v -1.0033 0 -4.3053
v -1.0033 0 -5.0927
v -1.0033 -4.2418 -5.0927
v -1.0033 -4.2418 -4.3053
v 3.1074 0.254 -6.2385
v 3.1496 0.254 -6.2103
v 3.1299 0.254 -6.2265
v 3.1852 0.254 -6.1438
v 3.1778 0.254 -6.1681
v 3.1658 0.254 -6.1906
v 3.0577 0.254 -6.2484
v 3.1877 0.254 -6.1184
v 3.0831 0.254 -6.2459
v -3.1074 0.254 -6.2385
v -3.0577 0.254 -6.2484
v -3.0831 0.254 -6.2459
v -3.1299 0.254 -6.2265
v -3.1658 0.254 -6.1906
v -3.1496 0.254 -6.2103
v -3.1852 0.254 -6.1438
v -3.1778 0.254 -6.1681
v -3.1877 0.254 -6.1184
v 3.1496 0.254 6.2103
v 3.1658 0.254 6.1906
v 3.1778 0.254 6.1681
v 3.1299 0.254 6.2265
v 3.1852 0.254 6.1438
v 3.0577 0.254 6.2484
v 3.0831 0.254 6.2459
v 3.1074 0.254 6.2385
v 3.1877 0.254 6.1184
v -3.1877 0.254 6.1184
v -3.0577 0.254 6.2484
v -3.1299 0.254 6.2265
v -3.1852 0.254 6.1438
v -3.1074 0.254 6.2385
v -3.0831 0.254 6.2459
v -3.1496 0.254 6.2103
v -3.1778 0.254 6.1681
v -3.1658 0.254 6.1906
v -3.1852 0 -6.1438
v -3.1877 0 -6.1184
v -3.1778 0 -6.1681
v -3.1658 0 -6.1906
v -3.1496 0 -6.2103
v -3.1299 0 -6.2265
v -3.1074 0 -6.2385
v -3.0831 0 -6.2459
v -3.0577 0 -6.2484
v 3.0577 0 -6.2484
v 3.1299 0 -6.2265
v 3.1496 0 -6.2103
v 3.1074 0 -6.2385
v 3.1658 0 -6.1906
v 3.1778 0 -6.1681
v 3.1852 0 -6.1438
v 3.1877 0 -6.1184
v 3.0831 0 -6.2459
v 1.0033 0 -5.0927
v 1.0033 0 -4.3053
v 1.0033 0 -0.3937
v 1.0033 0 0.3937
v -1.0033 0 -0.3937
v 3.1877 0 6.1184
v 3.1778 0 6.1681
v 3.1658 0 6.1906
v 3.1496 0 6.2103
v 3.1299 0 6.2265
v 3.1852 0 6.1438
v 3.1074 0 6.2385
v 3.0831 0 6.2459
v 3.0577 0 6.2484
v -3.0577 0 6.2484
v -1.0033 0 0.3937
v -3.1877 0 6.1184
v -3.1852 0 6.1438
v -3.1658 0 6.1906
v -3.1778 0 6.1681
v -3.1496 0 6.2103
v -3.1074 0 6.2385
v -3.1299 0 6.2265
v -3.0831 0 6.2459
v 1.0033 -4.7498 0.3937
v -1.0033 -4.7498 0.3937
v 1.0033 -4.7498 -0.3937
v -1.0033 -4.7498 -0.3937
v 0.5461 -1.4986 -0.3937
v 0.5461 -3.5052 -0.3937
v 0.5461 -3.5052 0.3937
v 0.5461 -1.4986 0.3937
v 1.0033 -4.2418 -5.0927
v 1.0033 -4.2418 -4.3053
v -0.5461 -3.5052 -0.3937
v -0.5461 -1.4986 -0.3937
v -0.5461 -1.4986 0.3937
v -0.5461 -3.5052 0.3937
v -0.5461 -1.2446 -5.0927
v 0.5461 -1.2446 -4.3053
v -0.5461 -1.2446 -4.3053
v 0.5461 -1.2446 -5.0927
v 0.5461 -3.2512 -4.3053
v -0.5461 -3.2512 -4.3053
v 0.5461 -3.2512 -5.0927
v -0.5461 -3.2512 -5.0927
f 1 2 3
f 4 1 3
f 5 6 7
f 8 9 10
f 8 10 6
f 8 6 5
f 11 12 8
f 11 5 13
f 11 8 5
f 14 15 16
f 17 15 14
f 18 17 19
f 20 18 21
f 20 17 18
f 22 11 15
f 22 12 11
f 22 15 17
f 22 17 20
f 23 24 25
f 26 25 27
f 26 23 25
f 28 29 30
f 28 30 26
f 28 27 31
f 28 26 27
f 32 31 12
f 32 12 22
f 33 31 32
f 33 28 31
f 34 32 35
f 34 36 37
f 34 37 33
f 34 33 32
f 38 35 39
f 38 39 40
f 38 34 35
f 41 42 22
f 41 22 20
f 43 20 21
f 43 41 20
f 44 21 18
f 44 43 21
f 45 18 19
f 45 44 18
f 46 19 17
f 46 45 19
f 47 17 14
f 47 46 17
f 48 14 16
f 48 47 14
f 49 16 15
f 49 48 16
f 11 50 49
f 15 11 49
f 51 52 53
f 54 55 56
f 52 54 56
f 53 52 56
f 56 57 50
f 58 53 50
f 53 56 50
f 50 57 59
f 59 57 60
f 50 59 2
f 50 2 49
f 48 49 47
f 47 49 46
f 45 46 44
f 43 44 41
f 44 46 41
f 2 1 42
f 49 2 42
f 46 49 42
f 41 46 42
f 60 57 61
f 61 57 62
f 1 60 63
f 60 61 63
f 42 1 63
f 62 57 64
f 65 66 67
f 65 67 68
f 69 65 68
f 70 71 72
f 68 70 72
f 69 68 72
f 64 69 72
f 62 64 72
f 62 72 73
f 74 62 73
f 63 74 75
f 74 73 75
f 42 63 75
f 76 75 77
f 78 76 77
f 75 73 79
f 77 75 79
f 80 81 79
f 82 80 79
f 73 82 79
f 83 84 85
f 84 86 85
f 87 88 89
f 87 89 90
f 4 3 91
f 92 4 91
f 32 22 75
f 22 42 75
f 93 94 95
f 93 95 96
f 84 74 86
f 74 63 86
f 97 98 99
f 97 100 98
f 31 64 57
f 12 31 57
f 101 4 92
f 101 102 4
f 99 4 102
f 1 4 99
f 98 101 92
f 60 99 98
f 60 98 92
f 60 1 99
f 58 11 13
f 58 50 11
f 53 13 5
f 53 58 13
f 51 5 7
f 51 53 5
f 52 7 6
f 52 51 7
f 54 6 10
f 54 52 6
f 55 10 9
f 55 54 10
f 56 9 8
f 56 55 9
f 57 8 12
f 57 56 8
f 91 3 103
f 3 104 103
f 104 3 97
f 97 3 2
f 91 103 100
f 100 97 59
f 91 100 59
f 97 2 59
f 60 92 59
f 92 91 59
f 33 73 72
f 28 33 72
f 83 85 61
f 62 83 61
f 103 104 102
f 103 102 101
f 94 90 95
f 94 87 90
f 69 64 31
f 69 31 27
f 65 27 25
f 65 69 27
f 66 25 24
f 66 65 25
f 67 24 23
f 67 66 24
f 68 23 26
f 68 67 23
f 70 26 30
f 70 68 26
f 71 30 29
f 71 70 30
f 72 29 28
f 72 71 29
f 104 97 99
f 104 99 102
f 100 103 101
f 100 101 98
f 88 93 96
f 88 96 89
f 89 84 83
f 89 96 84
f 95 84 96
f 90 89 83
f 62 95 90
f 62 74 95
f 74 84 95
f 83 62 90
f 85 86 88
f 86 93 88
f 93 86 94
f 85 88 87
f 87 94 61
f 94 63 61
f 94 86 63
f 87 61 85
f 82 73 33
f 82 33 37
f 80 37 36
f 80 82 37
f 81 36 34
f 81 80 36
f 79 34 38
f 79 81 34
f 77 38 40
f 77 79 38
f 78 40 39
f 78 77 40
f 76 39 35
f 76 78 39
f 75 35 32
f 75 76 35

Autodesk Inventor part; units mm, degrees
sketch "Sketch_2" plane through (0, 0, 0) normal (0, 1, 0) x (-1, 0, 0)
  line L0 (3.1877, -6.1184) -> (3.1877, 6.1184)
  arc A0 (3.1877, 6.1184) -> (3.0577, 6.2484) centre (3.0577, 6.1184) ccw
  line L1 (3.0577, 6.2484) -> (-3.0577, 6.2484)
  arc A1 (-3.0577, 6.2484) -> (-3.1877, 6.1184) centre (-3.0577, 6.1184) ccw
  line L2 (-3.1877, 6.1184) -> (-3.1877, -6.1184)
  arc A2 (-3.1877, -6.1184) -> (-3.0577, -6.2484) centre (-3.0577, -6.1184) ccw
  line L3 (-3.0577, -6.2484) -> (3.0577, -6.2484)
  arc A3 (3.0577, -6.2484) -> (3.1877, -6.1184) centre (3.0577, -6.1184) ccw
extrude "Extrusion1" add sketch "Sketch_2" along normal blind 0.254
sketch "Sketch_12" plane through (0, 0, -4.699) normal (0, 0, 1) x (1, 0, 0)
  line L0 (-1.0033, 0) -> (-1.0033, -4.2418)
  line L1 (-1.0033, -4.2418) -> (1.0033, -4.2418)
  line L2 (1.0033, -4.2418) -> (1.0033, 0)
  line L3 (1.0033, 0) -> (-1.0033, 0)
  line L4 (-0.5461, -1.2446) -> (-0.5461, -3.2512)
  line L5 (-0.5461, -3.2512) -> (0.5461, -3.2512)
  line L6 (0.5461, -3.2512) -> (0.5461, -1.2446)
  line L7 (0.5461, -1.2446) -> (-0.5461, -1.2446)
extrude "Extrusion2" add sketch "Sketch_12" along normal mid plane 0.7874
sketch "Sketch_14" plane through (0, 0, 0) normal (0, 0, 1) x (1, 0, 0)
  line L0 (-1.0033, 0) -> (-1.0033, -4.7498)
  line L1 (-1.0033, -4.7498) -> (1.0033, -4.7498)
  line L2 (1.0033, -4.7498) -> (1.0033, 0)
  line L3 (1.0033, 0) -> (-1.0033, 0)
  line L4 (-0.5461, -1.4986) -> (-0.5461, -3.5052)
  line L5 (-0.5461, -3.5052) -> (0.5461, -3.5052)
  line L6 (0.5461, -3.5052) -> (0.5461, -1.4986)
  line L7 (0.5461, -1.4986) -> (-0.5461, -1.4986)
extrude "Extrusion3" add sketch "Sketch_14" along normal mid plane 0.7874
ref_plane "to_base_XY" through (0, 0, 0) normal (0, 1, 0) x (1, 0, 0)
ref_plane "to_base_YZ" through (0, 0, 0) normal (1, 0, 0) x (0, 0, -1)
ref_plane "to_base_ZX" through (0, 0, 0) normal (0, 0, -1) x (0, 1, 0)
properties part number "M201101-terminals"
